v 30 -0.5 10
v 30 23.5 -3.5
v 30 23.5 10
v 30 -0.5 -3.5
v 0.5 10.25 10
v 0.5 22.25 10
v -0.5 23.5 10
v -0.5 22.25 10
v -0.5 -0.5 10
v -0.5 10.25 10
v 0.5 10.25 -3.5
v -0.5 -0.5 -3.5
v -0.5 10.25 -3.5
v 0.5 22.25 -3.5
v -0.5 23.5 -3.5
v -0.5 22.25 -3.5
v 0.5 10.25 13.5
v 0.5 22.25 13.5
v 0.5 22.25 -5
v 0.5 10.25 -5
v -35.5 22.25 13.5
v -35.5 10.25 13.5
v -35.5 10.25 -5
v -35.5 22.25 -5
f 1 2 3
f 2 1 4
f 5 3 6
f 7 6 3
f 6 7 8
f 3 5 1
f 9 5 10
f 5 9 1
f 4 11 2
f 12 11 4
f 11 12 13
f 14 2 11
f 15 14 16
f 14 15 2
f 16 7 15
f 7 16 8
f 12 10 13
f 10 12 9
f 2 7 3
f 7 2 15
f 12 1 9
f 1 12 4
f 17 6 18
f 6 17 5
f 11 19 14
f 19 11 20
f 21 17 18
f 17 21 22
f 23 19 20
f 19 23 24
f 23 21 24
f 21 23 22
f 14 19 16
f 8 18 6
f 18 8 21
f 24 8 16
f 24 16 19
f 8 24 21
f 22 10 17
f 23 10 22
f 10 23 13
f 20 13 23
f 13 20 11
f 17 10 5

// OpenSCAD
function micro_usb_plug_size() = [35, 11, 6];
function micro_usb_receptical_size() = [6, 7.5, 3];

function espruino_wifi_board_size() = [28, 23, 1];
function espruino_wifi_overhang_width() = 6 + 23.5 - 28;
function espruino_wifi_offset_depth() = -micro_usb_receptical_size()[2];

module espruino_wifi() {
    // Base PCB
    sz = espruino_wifi_board_size();
    board_w = sz[0];
    board_h = sz[1];
    board_d = sz[2];
    color("DarkGreen")
    cube([board_w, board_h, board_d]);

    // SMT Wifi Module PCB
    wifi_module_w = 23.5;
    wifi_module_h = 16;
    wifi_module_d = 1;
    wifi_module_offset = 6;
    color("DarkGreen")
    translate([wifi_module_offset, (board_h - wifi_module_h) / 2, wifi_module_d])
        cube([wifi_module_w, wifi_module_h, wifi_module_d]);

    // Wifi module
    wifi_w = 15;
    wifi_h = 11;
    color("Snow")
    translate([wifi_module_offset + 0.5, (board_h - wifi_module_h) / 2 + (wifi_module_h - wifi_h) / 2, board_d + wifi_module_d])
        cube([wifi_w, wifi_h, 1.5]);

    // CPU
    cpu_s = 7;
    cpu_d = 0.2;
    cpu_off = 10;
    color("Black")
    translate([cpu_off, (board_h - cpu_s) / 2, -cpu_d])
        cube([cpu_s, cpu_s, cpu_d]);

    // USB receptical
    u_sz = micro_usb_receptical_size();
    usb_w = u_sz[0];
    usb_h = u_sz[1];
    usb_d = u_sz[2];
    usb_h_off = board_h - usb_h - 3;
    translate([0, usb_h_off, -usb_d])
        cube([usb_w, usb_h, usb_d]);

    // USB Plug
    pu_sz = micro_usb_plug_size();
    plug_ko_w = pu_sz[0];
    plug_ko_h = pu_sz[1];
    plug_ko_d = pu_sz[2];
    color("DimGrey")
    translate([-plug_ko_w, usb_h_off - (plug_ko_h - usb_h) / 2, -plug_ko_d / 2 - usb_d / 2])
        cube([plug_ko_w, plug_ko_h, plug_ko_d]);

    // Pin blocks
    pin_base_s = 2.5;
    pin_spacing = 0.1 * 25.4;
    pin_s = 0.4;
    pin_len = 6 + pin_base_s + board_d + 1;
    pin_off = 6;
    color("DimGray")
    translate([0, 0, board_d])
        cube([board_w, pin_base_s, pin_base_s]);
    for (i = [0:10]) {
        translate([pin_spacing / 2 - pin_s / 2 + pin_spacing * i, pin_base_s / 2 - pin_s / 2, -1])
            cube([0.4, 0.4, pin_len]);
    }
    color("DimGray")
    translate([0, board_h - pin_base_s, board_d])
        cube([board_w, pin_base_s, pin_base_s]);
    for (i = [0:10]) {
        translate([pin_spacing / 2 - pin_s / 2 + pin_spacing * i, board_h - pin_base_s + pin_base_s / 2 - pin_s / 2, -1])
            cube([0.4, 0.4, pin_len]);
    }
}

module espruino_wifi_cutout(extra_depth = 0, pad = 1) {
    sz = espruino_wifi_board_size();
    board_w = sz[0];
    board_h = sz[1];
    board_d = sz[2];

    ovh_w = espruino_wifi_overhang_width();
    offset_d = espruino_wifi_offset_depth();

    u_sz = micro_usb_receptical_size();
    usb_w = u_sz[0];
    usb_h = u_sz[1];
    usb_d = u_sz[2];

    pu_sz = micro_usb_plug_size();
    plug_ko_w = pu_sz[0];
    plug_ko_h = pu_sz[1];
    plug_ko_d = pu_sz[2];

    usb_h_off = board_h - usb_h - 3;

    color("Red", 0.25)
    union() {
        translate([-pad / 2, -pad / 2, offset_d - pad / 2])
            cube([board_w + ovh_w + pad, board_h + pad, board_d + 11.5 + extra_depth + pad]);
        translate([-plug_ko_w - pad / 2, usb_h_off - (plug_ko_h - usb_h) / 2 - pad / 2, -plug_ko_d / 2 - usb_d / 2 - pad / 2])
            cube([plug_ko_w + pad, plug_ko_h + pad, plug_ko_d + pad + 11.5 + extra_depth]);
    }

}

espruino_wifi();
espruino_wifi_cutout();
